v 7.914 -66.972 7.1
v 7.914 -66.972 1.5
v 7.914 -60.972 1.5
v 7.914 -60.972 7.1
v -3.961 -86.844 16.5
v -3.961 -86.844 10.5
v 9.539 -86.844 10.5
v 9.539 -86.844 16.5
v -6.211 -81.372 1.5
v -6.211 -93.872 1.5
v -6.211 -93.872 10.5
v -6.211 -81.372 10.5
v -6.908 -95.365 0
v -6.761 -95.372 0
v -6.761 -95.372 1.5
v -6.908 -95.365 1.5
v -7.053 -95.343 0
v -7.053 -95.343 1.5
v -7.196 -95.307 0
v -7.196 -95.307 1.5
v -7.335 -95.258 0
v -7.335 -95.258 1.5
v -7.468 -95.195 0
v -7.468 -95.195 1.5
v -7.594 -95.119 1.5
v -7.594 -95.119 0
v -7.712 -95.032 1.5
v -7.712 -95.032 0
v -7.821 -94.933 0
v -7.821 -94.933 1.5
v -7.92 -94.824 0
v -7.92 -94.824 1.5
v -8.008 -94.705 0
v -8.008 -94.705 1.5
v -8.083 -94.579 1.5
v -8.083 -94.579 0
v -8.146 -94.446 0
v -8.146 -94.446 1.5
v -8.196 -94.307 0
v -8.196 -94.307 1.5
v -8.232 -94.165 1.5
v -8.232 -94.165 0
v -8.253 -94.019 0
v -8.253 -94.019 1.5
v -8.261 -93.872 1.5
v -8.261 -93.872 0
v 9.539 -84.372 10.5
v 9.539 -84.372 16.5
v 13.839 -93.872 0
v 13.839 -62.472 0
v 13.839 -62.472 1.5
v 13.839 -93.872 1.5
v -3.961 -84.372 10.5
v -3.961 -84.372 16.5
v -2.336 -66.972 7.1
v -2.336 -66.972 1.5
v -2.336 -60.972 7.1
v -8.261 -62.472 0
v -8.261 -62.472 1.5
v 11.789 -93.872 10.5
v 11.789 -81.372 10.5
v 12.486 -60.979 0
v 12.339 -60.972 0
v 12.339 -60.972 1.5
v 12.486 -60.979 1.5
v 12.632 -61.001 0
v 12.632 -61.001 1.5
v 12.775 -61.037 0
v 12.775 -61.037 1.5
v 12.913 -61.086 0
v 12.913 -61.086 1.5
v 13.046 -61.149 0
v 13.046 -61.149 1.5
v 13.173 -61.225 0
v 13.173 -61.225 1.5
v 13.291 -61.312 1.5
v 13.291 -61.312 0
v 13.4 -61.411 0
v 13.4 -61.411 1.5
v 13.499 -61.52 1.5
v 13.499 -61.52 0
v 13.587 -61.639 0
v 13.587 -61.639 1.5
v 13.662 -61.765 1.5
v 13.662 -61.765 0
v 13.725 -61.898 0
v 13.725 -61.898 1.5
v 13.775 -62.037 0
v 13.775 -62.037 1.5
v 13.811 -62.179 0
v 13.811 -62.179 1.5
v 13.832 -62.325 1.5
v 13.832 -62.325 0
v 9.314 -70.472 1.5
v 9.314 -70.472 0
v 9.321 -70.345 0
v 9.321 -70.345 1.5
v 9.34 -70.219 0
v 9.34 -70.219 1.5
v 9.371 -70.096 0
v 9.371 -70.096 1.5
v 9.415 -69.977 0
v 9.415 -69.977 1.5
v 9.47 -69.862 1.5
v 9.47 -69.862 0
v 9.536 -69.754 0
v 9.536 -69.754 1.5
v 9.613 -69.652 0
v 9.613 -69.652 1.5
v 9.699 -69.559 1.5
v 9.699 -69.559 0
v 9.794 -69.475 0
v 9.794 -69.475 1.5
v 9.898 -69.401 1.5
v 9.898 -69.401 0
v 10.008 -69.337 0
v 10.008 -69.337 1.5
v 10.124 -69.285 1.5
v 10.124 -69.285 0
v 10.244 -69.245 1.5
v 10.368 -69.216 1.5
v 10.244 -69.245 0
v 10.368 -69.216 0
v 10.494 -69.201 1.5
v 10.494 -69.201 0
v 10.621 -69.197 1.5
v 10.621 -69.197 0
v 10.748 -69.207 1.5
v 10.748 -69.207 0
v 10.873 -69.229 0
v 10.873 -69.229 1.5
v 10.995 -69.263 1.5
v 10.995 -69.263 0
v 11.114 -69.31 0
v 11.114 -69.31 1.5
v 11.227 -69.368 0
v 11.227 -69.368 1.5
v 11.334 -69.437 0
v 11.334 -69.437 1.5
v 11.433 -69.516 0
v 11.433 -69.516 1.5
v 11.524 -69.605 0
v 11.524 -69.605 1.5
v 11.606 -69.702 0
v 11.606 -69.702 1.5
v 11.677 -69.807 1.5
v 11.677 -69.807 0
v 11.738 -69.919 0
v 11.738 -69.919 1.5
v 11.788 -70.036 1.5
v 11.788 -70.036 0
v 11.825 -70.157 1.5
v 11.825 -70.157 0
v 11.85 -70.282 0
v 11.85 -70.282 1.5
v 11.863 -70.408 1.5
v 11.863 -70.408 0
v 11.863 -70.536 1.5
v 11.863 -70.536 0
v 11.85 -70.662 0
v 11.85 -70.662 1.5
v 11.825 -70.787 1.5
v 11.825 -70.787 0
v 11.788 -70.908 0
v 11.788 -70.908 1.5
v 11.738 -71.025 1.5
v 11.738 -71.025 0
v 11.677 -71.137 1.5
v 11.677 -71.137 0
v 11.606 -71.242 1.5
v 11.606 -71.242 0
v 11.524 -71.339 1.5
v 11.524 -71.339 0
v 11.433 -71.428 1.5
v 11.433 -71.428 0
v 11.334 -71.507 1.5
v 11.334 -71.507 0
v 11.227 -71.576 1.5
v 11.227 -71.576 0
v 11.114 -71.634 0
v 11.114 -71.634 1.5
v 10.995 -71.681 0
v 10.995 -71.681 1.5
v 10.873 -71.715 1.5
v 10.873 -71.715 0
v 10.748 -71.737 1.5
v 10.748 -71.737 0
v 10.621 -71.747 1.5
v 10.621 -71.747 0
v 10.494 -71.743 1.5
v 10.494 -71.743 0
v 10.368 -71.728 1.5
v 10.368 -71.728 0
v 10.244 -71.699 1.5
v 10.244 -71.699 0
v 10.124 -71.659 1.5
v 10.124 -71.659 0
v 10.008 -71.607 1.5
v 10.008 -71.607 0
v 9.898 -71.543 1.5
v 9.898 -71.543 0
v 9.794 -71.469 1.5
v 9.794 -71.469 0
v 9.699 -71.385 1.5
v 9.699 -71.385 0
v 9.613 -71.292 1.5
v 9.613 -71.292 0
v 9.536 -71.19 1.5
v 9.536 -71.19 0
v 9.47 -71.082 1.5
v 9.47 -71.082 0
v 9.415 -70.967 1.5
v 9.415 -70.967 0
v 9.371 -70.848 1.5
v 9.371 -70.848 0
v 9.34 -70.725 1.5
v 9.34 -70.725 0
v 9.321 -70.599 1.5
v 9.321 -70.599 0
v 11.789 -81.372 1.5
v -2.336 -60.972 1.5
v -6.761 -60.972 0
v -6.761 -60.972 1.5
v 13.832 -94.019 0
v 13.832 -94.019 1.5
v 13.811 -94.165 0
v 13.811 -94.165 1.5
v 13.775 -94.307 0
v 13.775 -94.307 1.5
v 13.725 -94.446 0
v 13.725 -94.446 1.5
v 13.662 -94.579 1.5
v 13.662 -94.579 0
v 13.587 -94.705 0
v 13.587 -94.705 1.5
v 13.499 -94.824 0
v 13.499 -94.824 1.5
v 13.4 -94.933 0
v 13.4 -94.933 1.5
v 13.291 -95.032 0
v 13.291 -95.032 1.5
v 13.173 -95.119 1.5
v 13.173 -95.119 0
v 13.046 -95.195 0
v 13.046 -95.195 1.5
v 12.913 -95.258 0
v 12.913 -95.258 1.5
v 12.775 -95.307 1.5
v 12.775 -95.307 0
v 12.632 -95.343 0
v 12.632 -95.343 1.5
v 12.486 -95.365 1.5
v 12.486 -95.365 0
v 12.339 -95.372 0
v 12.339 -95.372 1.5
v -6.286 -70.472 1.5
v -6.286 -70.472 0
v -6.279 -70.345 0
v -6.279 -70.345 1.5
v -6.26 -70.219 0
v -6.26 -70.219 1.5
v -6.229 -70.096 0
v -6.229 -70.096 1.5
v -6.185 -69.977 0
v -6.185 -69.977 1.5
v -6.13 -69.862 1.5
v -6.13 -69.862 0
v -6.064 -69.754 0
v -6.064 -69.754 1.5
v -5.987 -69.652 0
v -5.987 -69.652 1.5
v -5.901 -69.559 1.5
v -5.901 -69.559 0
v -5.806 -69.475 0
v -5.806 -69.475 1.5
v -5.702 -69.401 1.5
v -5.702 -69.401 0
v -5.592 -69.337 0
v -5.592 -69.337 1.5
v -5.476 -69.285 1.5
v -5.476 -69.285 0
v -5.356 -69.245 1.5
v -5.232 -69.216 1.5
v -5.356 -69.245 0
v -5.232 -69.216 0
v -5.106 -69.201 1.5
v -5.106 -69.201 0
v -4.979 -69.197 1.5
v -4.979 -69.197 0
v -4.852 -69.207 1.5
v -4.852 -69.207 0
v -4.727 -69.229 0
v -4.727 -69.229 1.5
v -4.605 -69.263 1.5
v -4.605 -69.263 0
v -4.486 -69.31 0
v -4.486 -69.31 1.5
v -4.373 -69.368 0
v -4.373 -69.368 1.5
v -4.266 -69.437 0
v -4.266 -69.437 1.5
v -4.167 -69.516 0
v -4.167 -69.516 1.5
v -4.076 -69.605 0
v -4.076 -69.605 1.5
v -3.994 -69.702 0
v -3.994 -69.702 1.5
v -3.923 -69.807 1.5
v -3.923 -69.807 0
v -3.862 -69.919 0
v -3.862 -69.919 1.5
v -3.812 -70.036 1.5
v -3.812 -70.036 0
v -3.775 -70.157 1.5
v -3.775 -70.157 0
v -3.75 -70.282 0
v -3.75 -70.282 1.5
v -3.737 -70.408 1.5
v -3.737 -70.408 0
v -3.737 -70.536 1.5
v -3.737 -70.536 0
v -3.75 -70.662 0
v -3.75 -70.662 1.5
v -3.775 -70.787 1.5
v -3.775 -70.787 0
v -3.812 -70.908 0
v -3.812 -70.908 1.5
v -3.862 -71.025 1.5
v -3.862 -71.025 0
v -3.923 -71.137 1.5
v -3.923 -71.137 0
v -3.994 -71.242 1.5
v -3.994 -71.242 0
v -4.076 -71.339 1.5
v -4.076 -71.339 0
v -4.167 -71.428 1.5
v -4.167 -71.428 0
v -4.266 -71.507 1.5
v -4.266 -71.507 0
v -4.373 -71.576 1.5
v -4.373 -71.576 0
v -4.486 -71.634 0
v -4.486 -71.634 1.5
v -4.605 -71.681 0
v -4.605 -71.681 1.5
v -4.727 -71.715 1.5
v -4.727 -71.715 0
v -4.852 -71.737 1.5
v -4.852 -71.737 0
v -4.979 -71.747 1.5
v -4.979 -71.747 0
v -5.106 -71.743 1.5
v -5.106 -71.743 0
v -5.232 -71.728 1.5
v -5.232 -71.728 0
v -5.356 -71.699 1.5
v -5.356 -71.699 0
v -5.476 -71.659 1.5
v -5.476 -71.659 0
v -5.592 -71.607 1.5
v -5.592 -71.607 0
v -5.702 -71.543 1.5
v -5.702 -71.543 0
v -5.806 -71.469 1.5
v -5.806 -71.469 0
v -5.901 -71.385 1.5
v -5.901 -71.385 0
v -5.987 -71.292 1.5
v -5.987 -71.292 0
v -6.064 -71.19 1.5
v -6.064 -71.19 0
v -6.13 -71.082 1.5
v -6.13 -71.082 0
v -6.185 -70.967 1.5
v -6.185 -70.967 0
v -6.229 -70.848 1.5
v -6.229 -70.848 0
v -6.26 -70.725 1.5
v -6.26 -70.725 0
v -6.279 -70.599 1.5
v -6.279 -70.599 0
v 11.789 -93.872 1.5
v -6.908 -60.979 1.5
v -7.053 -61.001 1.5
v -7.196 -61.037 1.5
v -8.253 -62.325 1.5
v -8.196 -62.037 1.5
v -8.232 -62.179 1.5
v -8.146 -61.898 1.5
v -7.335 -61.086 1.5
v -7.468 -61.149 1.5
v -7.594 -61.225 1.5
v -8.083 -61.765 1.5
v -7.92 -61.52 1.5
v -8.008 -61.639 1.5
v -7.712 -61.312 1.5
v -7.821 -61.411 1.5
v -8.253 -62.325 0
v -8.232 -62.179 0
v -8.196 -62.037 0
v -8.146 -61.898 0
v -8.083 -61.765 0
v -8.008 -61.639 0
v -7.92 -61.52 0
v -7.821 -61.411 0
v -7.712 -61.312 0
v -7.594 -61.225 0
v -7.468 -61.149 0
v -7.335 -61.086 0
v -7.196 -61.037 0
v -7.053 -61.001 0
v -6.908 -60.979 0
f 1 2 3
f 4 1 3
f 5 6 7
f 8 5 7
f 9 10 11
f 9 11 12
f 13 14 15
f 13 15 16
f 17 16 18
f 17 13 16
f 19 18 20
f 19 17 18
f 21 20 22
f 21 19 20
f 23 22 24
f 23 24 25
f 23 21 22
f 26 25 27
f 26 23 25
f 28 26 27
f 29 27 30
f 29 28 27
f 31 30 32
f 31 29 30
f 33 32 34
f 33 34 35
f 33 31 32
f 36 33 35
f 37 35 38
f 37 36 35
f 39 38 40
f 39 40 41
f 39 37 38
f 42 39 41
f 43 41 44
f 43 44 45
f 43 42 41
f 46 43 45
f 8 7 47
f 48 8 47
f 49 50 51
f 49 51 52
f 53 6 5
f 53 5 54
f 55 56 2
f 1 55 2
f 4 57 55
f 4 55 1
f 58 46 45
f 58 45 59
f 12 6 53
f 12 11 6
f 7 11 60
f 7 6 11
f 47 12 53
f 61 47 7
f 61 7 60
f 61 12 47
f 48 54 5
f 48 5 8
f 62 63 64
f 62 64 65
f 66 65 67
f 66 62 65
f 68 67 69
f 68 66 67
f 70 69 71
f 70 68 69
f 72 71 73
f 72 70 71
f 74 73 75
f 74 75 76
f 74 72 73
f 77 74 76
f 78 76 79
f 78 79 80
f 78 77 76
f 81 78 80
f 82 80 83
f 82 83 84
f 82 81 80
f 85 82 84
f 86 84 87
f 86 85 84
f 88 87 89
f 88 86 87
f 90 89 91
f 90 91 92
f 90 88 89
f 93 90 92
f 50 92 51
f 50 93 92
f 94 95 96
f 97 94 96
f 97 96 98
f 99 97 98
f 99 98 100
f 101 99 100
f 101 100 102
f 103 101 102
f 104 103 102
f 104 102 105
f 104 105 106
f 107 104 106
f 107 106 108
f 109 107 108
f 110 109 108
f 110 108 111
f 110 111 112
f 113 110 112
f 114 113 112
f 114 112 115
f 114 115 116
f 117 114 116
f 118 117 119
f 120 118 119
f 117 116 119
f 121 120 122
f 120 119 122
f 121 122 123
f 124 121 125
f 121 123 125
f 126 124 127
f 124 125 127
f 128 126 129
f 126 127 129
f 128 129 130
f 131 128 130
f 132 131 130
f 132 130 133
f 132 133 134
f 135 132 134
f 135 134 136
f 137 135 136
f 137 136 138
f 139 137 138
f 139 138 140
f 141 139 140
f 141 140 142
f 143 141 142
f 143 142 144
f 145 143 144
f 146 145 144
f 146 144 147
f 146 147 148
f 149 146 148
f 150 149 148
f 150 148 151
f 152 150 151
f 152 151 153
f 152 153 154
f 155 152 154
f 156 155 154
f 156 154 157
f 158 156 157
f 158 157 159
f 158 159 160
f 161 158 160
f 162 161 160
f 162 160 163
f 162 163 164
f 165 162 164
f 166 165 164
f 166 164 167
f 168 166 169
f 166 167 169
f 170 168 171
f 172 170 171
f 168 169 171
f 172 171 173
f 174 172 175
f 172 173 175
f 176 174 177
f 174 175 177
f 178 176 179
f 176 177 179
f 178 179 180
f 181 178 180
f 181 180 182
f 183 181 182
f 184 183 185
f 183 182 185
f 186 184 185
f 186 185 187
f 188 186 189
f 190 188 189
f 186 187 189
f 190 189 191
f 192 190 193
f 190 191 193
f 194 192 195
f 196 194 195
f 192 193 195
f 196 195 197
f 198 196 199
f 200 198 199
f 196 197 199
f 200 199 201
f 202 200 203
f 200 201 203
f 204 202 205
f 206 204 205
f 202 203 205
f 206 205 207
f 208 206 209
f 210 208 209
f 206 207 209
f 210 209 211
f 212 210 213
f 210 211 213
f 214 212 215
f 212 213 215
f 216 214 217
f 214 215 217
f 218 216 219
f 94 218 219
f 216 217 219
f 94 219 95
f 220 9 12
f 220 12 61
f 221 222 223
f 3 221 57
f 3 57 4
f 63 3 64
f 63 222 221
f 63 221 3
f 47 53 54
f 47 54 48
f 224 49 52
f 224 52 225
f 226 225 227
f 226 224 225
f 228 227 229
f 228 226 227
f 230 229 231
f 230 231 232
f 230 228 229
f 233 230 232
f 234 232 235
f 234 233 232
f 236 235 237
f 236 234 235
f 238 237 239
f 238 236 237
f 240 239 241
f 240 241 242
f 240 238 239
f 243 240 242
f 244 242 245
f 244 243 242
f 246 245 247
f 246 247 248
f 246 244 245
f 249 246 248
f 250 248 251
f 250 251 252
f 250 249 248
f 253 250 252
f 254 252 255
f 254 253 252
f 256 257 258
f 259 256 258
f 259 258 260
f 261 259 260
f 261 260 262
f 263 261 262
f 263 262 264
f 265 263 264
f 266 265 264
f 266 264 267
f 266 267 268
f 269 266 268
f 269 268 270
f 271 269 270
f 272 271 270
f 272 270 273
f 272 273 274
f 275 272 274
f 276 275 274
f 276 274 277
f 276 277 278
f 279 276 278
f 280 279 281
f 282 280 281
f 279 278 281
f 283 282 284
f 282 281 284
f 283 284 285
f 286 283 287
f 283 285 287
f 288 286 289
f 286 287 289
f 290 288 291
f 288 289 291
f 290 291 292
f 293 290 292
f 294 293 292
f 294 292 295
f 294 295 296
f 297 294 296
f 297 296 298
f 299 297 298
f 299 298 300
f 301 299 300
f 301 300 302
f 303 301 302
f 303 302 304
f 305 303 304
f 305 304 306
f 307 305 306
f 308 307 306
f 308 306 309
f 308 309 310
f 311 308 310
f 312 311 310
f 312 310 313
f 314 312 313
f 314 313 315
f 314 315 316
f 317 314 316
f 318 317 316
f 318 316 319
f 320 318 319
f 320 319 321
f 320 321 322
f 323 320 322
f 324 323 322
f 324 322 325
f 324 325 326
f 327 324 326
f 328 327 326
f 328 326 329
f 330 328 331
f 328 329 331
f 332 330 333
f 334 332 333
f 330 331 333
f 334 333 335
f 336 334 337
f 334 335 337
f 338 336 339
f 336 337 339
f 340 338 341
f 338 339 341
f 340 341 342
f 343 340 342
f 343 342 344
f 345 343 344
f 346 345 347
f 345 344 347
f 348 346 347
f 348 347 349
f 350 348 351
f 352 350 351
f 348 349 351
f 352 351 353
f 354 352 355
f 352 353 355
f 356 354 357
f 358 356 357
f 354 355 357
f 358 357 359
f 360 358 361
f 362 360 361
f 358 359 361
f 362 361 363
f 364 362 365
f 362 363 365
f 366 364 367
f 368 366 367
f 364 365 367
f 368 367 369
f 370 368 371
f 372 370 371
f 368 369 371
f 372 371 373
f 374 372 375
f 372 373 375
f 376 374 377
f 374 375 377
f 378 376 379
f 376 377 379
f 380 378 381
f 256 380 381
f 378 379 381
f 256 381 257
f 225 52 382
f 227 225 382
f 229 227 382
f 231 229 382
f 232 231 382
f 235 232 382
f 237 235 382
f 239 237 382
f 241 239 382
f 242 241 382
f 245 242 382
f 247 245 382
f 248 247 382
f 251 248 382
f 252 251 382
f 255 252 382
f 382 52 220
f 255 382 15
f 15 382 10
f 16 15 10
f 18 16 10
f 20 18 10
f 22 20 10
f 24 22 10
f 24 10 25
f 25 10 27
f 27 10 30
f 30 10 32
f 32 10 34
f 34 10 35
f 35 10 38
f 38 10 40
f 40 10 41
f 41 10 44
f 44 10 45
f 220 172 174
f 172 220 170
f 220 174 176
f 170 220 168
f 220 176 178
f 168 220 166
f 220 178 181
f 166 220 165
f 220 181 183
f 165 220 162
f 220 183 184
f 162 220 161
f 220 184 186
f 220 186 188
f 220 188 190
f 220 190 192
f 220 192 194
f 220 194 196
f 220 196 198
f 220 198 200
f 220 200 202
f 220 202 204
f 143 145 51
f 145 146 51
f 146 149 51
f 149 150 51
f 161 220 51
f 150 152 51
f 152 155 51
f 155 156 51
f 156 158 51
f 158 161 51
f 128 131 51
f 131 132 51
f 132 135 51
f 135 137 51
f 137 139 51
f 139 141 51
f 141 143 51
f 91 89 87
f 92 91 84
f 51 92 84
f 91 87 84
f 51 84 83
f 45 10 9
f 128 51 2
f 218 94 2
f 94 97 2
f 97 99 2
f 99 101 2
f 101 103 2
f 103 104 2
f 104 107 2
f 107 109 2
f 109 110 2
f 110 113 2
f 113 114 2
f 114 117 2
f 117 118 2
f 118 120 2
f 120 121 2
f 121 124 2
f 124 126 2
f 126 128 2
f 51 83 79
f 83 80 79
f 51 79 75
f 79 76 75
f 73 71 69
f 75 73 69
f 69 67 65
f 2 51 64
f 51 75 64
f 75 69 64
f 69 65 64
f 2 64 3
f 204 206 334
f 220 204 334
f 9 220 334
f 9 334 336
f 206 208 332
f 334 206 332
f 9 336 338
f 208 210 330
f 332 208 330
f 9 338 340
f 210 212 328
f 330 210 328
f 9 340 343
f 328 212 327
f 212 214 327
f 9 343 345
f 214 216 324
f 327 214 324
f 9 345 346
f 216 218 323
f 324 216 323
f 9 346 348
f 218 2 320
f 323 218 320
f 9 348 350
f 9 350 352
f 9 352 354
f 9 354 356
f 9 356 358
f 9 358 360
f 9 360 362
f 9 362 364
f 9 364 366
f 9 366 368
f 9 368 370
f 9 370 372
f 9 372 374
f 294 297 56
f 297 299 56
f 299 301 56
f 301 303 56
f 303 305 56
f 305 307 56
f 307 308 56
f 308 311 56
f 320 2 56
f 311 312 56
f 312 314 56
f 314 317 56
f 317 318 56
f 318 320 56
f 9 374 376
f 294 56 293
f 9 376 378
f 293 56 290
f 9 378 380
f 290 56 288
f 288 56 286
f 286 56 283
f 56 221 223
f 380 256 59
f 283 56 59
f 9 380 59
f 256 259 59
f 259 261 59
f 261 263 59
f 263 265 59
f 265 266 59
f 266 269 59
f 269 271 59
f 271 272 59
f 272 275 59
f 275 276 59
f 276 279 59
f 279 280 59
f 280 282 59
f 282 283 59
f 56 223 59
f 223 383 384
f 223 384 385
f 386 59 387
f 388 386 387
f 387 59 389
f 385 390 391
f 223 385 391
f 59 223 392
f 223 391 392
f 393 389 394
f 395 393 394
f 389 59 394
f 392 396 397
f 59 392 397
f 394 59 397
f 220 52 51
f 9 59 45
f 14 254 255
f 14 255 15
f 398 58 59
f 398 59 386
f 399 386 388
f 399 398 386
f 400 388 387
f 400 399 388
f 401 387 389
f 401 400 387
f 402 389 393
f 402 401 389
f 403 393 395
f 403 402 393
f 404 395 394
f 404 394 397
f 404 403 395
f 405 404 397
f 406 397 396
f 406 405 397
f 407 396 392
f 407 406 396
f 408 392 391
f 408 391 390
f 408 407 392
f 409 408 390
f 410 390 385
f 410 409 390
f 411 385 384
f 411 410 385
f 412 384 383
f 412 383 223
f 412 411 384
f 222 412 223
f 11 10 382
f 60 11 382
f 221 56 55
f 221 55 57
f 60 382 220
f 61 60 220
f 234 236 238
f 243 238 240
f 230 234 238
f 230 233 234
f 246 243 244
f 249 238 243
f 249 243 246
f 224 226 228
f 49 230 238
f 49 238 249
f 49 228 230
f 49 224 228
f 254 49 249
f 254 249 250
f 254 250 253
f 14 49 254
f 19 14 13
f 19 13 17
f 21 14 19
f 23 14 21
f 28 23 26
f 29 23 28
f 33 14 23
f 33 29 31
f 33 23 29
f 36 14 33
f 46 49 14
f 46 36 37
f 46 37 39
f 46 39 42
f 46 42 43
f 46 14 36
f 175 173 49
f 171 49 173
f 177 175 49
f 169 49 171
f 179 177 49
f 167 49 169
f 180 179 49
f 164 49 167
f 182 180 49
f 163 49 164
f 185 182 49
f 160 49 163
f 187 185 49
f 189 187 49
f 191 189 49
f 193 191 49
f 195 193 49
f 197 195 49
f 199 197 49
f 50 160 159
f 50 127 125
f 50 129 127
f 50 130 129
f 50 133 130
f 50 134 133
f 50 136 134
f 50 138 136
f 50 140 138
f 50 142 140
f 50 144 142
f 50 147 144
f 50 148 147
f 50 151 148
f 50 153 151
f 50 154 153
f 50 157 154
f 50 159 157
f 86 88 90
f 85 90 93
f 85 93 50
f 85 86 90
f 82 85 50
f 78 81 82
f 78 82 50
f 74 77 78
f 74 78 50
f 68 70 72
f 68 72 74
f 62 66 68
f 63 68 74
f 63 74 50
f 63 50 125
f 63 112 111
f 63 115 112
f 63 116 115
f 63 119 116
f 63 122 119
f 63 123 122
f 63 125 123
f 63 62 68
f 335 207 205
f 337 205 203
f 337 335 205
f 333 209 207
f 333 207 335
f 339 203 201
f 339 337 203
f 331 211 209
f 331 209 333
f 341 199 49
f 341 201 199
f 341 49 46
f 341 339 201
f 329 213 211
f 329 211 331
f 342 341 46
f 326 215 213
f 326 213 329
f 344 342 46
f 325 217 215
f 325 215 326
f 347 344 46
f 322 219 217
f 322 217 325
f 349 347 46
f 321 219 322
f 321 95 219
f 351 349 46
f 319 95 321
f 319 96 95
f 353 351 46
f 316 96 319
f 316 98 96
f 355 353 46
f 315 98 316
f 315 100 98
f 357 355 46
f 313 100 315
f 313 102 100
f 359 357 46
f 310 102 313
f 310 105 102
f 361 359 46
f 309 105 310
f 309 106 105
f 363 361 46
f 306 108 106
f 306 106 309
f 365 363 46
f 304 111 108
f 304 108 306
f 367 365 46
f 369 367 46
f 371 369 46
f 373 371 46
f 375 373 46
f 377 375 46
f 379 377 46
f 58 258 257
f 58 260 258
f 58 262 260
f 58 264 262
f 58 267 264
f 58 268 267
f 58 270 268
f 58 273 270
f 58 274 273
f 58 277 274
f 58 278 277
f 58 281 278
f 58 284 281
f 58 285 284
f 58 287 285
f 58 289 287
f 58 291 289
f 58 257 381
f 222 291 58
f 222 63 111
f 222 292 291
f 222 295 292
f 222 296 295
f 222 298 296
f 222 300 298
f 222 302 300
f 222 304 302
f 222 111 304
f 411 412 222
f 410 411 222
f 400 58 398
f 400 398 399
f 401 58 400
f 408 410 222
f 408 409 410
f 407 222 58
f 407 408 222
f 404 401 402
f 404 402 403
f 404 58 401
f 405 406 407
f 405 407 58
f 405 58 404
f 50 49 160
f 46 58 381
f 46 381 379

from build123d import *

# Parameters (mm, degrees)
EXTRUDE_1_DEPTH      = 1.5
SKETCH_2_W           = 18
SKETCH_2_H           = 12.5
EXTRUDE_2_DEPTH      = 9
SKETCH_3_W           = 13.5
SKETCH_3_H           = 2.47224136
EXTRUDE_3_DEPTH      = 6
SKETCH_4_W           = 10.25
SKETCH_4_H           = 6
EXTRUDE_4_DEPTH      = 5.6
HOLE_WIZARD_M2_5_1_D = 2.55


with BuildPart() as part:
    # 草圖1 → 填料-伸長1 (new body)
    with BuildSketch(Plane.XY):
        with BuildLine():
            Line((-6.760595539, -60.971994299), (12.339404461, -60.971994299))
            ThreePointArc((12.339404461, -60.971994299), (13.400064632, -61.411334127), (13.839404461, -62.471994299))
            Line((13.839404461, -62.471994299), (13.839404461, -93.871994299))
            ThreePointArc((13.839404461, -93.871994299), (13.400064632, -94.932654471), (12.339404461, -95.371994299))
            Line((12.339404461, -95.371994299), (-6.760595539, -95.371994299))
            ThreePointArc((-6.760595539, -95.371994299), (-7.821255711, -94.932654471), (-8.260595539, -93.871994299))
            Line((-8.260595539, -93.871994299), (-8.260595539, -62.471994299))
            ThreePointArc((-8.260595539, -62.471994299), (-7.821255711, -61.411334127), (-6.760595539, -60.971994299))
        make_face()
    extrude(amount=EXTRUDE_1_DEPTH)

    # 草圖2 → 填料-伸長2 (add)
    with BuildSketch(Plane.XY.offset(1.5)):
        with Locations((2.789404461, -87.621994299)):
            Rectangle(SKETCH_2_W, SKETCH_2_H)
    extrude(amount=EXTRUDE_2_DEPTH)

    # 草圖3 → 填料-伸長3 (add)
    with BuildSketch(Plane.XY.offset(10.5)):
        with Locations((2.789404461, -85.608114979)):
            Rectangle(SKETCH_3_W, SKETCH_3_H)
    extrude(amount=EXTRUDE_3_DEPTH)

    # 草圖4 → 填料-伸長4 (add)
    with BuildSketch(Plane.XY.offset(1.5)):
        with Locations((2.789404461, -63.971994299)):
            Rectangle(SKETCH_4_W, SKETCH_4_H)
    extrude(amount=EXTRUDE_4_DEPTH)

    # M2.5 螺旋的螺孔鑽1 (through all)
    with Locations(Plane.XY.offset(1.5)):
        with Locations((-5.010595539, -70.471994299), (10.589404461, -70.471994299)):
            Hole(HOLE_WIZARD_M2_5_1_D / 2)


solid = part.part
